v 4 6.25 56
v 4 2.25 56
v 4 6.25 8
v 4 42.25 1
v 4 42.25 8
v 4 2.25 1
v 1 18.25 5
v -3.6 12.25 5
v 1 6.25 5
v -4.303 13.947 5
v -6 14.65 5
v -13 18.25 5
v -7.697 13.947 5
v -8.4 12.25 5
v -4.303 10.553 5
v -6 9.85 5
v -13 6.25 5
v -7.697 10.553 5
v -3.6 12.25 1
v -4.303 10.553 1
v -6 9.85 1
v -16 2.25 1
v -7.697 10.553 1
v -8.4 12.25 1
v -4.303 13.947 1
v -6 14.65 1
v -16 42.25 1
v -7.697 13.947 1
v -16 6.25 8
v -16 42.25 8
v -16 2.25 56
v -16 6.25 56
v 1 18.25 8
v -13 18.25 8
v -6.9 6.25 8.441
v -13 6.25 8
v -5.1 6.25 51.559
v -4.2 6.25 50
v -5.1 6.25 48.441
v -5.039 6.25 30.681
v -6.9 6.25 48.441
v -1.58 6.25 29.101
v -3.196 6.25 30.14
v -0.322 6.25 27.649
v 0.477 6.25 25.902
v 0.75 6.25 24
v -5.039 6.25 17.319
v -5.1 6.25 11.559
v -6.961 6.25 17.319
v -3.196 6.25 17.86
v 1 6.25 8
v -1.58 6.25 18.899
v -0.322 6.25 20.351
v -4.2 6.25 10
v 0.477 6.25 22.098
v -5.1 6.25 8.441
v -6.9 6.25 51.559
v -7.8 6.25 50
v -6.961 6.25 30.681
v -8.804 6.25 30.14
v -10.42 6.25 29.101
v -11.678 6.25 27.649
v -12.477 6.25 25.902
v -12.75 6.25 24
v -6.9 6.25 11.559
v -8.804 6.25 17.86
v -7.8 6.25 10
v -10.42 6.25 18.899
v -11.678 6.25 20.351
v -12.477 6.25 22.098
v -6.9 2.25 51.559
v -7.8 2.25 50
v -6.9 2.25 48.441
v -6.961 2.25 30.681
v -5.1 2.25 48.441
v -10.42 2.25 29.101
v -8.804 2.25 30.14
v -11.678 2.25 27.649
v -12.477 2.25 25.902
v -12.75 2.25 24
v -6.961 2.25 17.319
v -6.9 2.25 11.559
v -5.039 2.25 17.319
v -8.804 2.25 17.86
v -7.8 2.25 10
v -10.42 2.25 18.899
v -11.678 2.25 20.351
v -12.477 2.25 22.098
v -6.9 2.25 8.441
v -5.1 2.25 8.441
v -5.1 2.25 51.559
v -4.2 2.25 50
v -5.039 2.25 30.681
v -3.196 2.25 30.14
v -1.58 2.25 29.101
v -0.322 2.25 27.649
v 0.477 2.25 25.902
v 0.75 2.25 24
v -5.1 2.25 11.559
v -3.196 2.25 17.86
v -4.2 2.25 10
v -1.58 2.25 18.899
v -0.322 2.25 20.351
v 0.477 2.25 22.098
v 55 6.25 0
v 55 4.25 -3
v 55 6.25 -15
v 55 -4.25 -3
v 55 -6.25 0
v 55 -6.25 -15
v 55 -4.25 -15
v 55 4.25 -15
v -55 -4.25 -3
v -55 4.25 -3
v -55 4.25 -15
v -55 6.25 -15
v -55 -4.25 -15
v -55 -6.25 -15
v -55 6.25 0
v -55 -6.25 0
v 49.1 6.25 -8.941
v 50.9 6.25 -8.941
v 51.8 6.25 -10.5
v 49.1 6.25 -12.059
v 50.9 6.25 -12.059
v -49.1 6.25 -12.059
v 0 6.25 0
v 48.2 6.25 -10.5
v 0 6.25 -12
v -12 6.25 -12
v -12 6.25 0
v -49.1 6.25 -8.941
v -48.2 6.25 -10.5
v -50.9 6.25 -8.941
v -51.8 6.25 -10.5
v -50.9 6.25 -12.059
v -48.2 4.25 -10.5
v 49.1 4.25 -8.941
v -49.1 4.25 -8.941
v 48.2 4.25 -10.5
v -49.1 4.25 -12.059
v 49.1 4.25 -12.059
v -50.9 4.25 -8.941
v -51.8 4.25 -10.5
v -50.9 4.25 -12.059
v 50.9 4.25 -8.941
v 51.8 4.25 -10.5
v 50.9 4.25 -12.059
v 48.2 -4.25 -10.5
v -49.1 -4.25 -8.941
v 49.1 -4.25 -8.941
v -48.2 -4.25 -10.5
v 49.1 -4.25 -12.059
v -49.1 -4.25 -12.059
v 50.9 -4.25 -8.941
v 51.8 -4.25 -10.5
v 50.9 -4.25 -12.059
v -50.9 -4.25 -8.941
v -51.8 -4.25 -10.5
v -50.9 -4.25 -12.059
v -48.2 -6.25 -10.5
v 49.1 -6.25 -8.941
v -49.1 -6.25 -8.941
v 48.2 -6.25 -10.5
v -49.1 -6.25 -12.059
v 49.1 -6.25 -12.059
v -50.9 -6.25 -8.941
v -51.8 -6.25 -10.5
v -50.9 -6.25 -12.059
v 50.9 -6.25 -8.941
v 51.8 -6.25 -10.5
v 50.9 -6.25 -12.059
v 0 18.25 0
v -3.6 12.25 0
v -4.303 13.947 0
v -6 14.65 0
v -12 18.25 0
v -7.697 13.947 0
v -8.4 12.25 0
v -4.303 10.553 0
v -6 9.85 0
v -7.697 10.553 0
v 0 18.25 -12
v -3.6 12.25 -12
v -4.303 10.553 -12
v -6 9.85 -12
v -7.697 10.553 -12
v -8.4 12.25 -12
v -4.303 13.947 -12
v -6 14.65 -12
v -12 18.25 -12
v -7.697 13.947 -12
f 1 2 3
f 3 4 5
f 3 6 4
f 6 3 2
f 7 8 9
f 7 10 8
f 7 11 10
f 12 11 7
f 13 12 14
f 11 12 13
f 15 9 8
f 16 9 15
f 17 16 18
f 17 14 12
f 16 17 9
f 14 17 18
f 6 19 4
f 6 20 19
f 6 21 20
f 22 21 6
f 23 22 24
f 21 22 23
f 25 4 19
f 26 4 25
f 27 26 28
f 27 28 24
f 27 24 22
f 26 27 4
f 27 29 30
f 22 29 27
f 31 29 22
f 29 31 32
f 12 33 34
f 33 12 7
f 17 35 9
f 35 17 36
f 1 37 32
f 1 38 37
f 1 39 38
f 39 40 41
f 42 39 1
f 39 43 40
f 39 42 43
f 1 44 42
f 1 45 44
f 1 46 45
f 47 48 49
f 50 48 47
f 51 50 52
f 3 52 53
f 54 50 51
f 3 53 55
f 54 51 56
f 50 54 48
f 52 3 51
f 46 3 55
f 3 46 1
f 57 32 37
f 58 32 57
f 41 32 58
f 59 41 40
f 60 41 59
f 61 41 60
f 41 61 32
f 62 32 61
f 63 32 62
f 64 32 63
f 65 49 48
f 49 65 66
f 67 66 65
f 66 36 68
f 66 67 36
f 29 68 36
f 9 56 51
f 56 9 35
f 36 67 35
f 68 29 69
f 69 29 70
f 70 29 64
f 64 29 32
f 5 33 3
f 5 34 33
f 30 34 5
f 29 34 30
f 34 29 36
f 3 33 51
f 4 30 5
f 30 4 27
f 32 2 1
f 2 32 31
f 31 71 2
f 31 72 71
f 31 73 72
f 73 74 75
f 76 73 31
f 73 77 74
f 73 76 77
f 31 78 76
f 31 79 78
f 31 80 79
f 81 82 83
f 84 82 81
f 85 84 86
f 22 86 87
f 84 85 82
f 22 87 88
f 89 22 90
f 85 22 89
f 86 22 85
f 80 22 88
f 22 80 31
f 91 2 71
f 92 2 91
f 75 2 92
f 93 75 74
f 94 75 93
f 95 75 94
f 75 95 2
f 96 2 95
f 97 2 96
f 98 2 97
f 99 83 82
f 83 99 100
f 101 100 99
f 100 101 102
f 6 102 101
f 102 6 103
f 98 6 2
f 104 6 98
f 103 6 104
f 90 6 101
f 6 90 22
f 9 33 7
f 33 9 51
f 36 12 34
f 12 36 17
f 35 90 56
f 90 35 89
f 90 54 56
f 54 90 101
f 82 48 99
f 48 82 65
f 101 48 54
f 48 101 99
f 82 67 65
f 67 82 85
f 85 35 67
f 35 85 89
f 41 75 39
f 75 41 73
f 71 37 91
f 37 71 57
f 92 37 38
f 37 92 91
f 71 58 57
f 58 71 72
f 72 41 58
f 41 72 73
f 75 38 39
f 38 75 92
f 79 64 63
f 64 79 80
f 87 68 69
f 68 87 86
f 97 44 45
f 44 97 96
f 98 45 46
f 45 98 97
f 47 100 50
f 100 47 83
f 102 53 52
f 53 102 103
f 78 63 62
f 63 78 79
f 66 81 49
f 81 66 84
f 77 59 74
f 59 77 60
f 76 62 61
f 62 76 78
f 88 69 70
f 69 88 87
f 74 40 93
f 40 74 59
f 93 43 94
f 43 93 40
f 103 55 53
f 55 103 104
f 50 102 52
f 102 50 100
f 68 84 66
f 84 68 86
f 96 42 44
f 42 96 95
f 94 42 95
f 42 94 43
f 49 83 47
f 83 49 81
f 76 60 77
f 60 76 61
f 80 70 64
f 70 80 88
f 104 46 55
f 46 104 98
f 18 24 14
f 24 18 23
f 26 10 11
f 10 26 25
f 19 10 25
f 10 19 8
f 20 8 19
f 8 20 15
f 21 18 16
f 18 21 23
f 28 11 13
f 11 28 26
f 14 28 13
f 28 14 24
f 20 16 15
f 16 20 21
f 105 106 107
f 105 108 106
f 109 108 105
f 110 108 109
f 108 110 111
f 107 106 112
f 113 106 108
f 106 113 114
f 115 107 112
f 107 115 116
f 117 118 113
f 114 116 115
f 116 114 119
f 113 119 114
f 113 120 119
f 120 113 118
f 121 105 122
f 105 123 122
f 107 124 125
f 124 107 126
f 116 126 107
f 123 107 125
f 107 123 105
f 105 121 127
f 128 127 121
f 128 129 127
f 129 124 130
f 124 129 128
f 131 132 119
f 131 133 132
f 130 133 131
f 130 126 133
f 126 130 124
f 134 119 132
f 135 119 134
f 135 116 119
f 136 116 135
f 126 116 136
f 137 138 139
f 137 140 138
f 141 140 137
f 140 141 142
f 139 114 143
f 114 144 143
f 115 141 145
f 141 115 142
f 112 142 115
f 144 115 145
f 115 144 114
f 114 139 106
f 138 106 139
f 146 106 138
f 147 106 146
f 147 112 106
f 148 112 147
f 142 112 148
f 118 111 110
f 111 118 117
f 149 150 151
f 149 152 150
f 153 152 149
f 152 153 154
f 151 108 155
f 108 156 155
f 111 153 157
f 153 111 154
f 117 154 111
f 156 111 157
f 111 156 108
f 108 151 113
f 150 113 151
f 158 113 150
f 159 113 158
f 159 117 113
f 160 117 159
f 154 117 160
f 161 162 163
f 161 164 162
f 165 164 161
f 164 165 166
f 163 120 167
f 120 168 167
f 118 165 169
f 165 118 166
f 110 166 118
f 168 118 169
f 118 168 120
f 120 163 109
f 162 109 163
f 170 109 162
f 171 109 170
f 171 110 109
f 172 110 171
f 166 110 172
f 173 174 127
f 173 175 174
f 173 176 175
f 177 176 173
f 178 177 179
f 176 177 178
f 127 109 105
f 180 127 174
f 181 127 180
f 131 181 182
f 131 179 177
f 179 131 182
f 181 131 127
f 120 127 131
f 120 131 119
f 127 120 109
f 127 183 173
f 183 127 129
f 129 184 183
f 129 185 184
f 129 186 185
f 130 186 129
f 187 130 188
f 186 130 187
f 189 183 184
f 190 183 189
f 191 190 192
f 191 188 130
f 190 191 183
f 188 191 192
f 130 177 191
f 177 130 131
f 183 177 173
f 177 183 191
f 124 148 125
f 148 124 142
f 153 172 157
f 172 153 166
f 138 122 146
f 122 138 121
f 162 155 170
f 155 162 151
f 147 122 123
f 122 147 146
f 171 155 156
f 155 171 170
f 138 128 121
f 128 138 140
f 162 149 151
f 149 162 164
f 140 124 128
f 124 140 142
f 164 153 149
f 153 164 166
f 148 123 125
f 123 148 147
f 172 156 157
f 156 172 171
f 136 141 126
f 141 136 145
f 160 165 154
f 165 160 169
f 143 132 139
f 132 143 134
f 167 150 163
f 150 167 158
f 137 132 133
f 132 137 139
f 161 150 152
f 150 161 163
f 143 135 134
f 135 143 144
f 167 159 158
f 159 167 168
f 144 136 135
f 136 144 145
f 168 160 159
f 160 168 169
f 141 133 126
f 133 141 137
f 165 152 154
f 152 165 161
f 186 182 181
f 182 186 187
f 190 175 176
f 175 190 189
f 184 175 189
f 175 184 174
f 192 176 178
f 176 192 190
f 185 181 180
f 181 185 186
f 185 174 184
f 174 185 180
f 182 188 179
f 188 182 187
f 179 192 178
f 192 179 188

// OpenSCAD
/* [Global] */

// Which one would you like to see?
part = "both"; // [Extruder Holder,Frame Holder,both]

// Pivot point diameter
Pivot_Dia = 4.8;



/* [Frame Holder] */

// I3 Frame thickness (of acrylic)
Frame_Thickness = 8.5;

// I3 Frame mounting hole distance
Frame_Mounting_Dist = 100;

// I3 Frame mounting hole diameter
Frame_Mounting_Dia = 3.6;



/* [Extruder Holder] */

// Extruder mounting hole diameter
Extr_Mounting_Dia = 3.6;

// Extruder mounting hole distance
Extr_Mounting_Dist = 40;

print_part();

module print_part() {
	if (part == "Extruder Holder") {
		extr_holder();
	} else if (part == "Frame Holder") {
		frame_holder();
	} else {
		color("Green") translate([-6, Frame_Thickness/2+2+6, 3]) extr_holder();
        frame_holder();
	}
};

module extr_holder()
{
    difference()
    {
        union()
        {
            cube([20,12,4], center=true);
            
            translate([0,12+6,3.5-2])
                cube([20,24,7], center=true);
            
            translate([0,-2-6,(Extr_Mounting_Dist * 1.2 + 7)/2 - 2])
                cube([20,4,Extr_Mounting_Dist* 1.2 + 7], center=true);
            translate([(20-3)/2,0,+2+1.5])
                cube([3,12,3], center=true);
            translate([-(20-3)/2,0,+2+1.5])
                cube([3,12,3], center=true);
        };
        
        union()
        {
            cylinder(d=Pivot_Dia, h=7,center=true);
            translate([0,-2-6,7]) union()
            {
                rotate([90,0,0])
                    cylinder(d=Extr_Mounting_Dia, h=5, center=true);
                
                translate([0,0,Extr_Mounting_Dist])
                    rotate([90,0,0])
                        cylinder(d=Extr_Mounting_Dia, h=5, center=true);
                
                translate([0,0,14]) rotate([90,0,0])
                    cylinder(d=13.5, h=5, center=true);
            };
        };
    };
};

module frame_holder()
{
    difference()
    {
        union()
        {
        translate([0,Frame_Thickness / 2 + 1,-6-3]) cube([Frame_Mounting_Dist * 1.1,2,12], center=true);

         translate([0,-Frame_Thickness / 2 - 1,-6-3])cube([Frame_Mounting_Dist * 1.1,2,12], center=true);

        translate([0,0,-1.5])
            cube([Frame_Mounting_Dist * 1.1,Frame_Thickness+4,3], center=true);
            
            translate([-6,Frame_Thickness/2+2+6,-6])
                cube(12, center=true);
        };
        
        union()
        {
            translate([Frame_Mounting_Dist/2,0,-7.5-3]) rotate([90,0,0])
            cylinder(d=Frame_Mounting_Dia, h=Frame_Thickness + 7, center=true);

        translate([-Frame_Mounting_Dist/2,0,-7.5-3]) rotate([90,0,0])
            cylinder(d=Frame_Mounting_Dia, h=Frame_Thickness + 7, center=true);
        };
        
        translate([-6,Frame_Thickness/2+2+6,-6])
        cylinder(d=Pivot_Dia, h=13,center=true);
    };
};
